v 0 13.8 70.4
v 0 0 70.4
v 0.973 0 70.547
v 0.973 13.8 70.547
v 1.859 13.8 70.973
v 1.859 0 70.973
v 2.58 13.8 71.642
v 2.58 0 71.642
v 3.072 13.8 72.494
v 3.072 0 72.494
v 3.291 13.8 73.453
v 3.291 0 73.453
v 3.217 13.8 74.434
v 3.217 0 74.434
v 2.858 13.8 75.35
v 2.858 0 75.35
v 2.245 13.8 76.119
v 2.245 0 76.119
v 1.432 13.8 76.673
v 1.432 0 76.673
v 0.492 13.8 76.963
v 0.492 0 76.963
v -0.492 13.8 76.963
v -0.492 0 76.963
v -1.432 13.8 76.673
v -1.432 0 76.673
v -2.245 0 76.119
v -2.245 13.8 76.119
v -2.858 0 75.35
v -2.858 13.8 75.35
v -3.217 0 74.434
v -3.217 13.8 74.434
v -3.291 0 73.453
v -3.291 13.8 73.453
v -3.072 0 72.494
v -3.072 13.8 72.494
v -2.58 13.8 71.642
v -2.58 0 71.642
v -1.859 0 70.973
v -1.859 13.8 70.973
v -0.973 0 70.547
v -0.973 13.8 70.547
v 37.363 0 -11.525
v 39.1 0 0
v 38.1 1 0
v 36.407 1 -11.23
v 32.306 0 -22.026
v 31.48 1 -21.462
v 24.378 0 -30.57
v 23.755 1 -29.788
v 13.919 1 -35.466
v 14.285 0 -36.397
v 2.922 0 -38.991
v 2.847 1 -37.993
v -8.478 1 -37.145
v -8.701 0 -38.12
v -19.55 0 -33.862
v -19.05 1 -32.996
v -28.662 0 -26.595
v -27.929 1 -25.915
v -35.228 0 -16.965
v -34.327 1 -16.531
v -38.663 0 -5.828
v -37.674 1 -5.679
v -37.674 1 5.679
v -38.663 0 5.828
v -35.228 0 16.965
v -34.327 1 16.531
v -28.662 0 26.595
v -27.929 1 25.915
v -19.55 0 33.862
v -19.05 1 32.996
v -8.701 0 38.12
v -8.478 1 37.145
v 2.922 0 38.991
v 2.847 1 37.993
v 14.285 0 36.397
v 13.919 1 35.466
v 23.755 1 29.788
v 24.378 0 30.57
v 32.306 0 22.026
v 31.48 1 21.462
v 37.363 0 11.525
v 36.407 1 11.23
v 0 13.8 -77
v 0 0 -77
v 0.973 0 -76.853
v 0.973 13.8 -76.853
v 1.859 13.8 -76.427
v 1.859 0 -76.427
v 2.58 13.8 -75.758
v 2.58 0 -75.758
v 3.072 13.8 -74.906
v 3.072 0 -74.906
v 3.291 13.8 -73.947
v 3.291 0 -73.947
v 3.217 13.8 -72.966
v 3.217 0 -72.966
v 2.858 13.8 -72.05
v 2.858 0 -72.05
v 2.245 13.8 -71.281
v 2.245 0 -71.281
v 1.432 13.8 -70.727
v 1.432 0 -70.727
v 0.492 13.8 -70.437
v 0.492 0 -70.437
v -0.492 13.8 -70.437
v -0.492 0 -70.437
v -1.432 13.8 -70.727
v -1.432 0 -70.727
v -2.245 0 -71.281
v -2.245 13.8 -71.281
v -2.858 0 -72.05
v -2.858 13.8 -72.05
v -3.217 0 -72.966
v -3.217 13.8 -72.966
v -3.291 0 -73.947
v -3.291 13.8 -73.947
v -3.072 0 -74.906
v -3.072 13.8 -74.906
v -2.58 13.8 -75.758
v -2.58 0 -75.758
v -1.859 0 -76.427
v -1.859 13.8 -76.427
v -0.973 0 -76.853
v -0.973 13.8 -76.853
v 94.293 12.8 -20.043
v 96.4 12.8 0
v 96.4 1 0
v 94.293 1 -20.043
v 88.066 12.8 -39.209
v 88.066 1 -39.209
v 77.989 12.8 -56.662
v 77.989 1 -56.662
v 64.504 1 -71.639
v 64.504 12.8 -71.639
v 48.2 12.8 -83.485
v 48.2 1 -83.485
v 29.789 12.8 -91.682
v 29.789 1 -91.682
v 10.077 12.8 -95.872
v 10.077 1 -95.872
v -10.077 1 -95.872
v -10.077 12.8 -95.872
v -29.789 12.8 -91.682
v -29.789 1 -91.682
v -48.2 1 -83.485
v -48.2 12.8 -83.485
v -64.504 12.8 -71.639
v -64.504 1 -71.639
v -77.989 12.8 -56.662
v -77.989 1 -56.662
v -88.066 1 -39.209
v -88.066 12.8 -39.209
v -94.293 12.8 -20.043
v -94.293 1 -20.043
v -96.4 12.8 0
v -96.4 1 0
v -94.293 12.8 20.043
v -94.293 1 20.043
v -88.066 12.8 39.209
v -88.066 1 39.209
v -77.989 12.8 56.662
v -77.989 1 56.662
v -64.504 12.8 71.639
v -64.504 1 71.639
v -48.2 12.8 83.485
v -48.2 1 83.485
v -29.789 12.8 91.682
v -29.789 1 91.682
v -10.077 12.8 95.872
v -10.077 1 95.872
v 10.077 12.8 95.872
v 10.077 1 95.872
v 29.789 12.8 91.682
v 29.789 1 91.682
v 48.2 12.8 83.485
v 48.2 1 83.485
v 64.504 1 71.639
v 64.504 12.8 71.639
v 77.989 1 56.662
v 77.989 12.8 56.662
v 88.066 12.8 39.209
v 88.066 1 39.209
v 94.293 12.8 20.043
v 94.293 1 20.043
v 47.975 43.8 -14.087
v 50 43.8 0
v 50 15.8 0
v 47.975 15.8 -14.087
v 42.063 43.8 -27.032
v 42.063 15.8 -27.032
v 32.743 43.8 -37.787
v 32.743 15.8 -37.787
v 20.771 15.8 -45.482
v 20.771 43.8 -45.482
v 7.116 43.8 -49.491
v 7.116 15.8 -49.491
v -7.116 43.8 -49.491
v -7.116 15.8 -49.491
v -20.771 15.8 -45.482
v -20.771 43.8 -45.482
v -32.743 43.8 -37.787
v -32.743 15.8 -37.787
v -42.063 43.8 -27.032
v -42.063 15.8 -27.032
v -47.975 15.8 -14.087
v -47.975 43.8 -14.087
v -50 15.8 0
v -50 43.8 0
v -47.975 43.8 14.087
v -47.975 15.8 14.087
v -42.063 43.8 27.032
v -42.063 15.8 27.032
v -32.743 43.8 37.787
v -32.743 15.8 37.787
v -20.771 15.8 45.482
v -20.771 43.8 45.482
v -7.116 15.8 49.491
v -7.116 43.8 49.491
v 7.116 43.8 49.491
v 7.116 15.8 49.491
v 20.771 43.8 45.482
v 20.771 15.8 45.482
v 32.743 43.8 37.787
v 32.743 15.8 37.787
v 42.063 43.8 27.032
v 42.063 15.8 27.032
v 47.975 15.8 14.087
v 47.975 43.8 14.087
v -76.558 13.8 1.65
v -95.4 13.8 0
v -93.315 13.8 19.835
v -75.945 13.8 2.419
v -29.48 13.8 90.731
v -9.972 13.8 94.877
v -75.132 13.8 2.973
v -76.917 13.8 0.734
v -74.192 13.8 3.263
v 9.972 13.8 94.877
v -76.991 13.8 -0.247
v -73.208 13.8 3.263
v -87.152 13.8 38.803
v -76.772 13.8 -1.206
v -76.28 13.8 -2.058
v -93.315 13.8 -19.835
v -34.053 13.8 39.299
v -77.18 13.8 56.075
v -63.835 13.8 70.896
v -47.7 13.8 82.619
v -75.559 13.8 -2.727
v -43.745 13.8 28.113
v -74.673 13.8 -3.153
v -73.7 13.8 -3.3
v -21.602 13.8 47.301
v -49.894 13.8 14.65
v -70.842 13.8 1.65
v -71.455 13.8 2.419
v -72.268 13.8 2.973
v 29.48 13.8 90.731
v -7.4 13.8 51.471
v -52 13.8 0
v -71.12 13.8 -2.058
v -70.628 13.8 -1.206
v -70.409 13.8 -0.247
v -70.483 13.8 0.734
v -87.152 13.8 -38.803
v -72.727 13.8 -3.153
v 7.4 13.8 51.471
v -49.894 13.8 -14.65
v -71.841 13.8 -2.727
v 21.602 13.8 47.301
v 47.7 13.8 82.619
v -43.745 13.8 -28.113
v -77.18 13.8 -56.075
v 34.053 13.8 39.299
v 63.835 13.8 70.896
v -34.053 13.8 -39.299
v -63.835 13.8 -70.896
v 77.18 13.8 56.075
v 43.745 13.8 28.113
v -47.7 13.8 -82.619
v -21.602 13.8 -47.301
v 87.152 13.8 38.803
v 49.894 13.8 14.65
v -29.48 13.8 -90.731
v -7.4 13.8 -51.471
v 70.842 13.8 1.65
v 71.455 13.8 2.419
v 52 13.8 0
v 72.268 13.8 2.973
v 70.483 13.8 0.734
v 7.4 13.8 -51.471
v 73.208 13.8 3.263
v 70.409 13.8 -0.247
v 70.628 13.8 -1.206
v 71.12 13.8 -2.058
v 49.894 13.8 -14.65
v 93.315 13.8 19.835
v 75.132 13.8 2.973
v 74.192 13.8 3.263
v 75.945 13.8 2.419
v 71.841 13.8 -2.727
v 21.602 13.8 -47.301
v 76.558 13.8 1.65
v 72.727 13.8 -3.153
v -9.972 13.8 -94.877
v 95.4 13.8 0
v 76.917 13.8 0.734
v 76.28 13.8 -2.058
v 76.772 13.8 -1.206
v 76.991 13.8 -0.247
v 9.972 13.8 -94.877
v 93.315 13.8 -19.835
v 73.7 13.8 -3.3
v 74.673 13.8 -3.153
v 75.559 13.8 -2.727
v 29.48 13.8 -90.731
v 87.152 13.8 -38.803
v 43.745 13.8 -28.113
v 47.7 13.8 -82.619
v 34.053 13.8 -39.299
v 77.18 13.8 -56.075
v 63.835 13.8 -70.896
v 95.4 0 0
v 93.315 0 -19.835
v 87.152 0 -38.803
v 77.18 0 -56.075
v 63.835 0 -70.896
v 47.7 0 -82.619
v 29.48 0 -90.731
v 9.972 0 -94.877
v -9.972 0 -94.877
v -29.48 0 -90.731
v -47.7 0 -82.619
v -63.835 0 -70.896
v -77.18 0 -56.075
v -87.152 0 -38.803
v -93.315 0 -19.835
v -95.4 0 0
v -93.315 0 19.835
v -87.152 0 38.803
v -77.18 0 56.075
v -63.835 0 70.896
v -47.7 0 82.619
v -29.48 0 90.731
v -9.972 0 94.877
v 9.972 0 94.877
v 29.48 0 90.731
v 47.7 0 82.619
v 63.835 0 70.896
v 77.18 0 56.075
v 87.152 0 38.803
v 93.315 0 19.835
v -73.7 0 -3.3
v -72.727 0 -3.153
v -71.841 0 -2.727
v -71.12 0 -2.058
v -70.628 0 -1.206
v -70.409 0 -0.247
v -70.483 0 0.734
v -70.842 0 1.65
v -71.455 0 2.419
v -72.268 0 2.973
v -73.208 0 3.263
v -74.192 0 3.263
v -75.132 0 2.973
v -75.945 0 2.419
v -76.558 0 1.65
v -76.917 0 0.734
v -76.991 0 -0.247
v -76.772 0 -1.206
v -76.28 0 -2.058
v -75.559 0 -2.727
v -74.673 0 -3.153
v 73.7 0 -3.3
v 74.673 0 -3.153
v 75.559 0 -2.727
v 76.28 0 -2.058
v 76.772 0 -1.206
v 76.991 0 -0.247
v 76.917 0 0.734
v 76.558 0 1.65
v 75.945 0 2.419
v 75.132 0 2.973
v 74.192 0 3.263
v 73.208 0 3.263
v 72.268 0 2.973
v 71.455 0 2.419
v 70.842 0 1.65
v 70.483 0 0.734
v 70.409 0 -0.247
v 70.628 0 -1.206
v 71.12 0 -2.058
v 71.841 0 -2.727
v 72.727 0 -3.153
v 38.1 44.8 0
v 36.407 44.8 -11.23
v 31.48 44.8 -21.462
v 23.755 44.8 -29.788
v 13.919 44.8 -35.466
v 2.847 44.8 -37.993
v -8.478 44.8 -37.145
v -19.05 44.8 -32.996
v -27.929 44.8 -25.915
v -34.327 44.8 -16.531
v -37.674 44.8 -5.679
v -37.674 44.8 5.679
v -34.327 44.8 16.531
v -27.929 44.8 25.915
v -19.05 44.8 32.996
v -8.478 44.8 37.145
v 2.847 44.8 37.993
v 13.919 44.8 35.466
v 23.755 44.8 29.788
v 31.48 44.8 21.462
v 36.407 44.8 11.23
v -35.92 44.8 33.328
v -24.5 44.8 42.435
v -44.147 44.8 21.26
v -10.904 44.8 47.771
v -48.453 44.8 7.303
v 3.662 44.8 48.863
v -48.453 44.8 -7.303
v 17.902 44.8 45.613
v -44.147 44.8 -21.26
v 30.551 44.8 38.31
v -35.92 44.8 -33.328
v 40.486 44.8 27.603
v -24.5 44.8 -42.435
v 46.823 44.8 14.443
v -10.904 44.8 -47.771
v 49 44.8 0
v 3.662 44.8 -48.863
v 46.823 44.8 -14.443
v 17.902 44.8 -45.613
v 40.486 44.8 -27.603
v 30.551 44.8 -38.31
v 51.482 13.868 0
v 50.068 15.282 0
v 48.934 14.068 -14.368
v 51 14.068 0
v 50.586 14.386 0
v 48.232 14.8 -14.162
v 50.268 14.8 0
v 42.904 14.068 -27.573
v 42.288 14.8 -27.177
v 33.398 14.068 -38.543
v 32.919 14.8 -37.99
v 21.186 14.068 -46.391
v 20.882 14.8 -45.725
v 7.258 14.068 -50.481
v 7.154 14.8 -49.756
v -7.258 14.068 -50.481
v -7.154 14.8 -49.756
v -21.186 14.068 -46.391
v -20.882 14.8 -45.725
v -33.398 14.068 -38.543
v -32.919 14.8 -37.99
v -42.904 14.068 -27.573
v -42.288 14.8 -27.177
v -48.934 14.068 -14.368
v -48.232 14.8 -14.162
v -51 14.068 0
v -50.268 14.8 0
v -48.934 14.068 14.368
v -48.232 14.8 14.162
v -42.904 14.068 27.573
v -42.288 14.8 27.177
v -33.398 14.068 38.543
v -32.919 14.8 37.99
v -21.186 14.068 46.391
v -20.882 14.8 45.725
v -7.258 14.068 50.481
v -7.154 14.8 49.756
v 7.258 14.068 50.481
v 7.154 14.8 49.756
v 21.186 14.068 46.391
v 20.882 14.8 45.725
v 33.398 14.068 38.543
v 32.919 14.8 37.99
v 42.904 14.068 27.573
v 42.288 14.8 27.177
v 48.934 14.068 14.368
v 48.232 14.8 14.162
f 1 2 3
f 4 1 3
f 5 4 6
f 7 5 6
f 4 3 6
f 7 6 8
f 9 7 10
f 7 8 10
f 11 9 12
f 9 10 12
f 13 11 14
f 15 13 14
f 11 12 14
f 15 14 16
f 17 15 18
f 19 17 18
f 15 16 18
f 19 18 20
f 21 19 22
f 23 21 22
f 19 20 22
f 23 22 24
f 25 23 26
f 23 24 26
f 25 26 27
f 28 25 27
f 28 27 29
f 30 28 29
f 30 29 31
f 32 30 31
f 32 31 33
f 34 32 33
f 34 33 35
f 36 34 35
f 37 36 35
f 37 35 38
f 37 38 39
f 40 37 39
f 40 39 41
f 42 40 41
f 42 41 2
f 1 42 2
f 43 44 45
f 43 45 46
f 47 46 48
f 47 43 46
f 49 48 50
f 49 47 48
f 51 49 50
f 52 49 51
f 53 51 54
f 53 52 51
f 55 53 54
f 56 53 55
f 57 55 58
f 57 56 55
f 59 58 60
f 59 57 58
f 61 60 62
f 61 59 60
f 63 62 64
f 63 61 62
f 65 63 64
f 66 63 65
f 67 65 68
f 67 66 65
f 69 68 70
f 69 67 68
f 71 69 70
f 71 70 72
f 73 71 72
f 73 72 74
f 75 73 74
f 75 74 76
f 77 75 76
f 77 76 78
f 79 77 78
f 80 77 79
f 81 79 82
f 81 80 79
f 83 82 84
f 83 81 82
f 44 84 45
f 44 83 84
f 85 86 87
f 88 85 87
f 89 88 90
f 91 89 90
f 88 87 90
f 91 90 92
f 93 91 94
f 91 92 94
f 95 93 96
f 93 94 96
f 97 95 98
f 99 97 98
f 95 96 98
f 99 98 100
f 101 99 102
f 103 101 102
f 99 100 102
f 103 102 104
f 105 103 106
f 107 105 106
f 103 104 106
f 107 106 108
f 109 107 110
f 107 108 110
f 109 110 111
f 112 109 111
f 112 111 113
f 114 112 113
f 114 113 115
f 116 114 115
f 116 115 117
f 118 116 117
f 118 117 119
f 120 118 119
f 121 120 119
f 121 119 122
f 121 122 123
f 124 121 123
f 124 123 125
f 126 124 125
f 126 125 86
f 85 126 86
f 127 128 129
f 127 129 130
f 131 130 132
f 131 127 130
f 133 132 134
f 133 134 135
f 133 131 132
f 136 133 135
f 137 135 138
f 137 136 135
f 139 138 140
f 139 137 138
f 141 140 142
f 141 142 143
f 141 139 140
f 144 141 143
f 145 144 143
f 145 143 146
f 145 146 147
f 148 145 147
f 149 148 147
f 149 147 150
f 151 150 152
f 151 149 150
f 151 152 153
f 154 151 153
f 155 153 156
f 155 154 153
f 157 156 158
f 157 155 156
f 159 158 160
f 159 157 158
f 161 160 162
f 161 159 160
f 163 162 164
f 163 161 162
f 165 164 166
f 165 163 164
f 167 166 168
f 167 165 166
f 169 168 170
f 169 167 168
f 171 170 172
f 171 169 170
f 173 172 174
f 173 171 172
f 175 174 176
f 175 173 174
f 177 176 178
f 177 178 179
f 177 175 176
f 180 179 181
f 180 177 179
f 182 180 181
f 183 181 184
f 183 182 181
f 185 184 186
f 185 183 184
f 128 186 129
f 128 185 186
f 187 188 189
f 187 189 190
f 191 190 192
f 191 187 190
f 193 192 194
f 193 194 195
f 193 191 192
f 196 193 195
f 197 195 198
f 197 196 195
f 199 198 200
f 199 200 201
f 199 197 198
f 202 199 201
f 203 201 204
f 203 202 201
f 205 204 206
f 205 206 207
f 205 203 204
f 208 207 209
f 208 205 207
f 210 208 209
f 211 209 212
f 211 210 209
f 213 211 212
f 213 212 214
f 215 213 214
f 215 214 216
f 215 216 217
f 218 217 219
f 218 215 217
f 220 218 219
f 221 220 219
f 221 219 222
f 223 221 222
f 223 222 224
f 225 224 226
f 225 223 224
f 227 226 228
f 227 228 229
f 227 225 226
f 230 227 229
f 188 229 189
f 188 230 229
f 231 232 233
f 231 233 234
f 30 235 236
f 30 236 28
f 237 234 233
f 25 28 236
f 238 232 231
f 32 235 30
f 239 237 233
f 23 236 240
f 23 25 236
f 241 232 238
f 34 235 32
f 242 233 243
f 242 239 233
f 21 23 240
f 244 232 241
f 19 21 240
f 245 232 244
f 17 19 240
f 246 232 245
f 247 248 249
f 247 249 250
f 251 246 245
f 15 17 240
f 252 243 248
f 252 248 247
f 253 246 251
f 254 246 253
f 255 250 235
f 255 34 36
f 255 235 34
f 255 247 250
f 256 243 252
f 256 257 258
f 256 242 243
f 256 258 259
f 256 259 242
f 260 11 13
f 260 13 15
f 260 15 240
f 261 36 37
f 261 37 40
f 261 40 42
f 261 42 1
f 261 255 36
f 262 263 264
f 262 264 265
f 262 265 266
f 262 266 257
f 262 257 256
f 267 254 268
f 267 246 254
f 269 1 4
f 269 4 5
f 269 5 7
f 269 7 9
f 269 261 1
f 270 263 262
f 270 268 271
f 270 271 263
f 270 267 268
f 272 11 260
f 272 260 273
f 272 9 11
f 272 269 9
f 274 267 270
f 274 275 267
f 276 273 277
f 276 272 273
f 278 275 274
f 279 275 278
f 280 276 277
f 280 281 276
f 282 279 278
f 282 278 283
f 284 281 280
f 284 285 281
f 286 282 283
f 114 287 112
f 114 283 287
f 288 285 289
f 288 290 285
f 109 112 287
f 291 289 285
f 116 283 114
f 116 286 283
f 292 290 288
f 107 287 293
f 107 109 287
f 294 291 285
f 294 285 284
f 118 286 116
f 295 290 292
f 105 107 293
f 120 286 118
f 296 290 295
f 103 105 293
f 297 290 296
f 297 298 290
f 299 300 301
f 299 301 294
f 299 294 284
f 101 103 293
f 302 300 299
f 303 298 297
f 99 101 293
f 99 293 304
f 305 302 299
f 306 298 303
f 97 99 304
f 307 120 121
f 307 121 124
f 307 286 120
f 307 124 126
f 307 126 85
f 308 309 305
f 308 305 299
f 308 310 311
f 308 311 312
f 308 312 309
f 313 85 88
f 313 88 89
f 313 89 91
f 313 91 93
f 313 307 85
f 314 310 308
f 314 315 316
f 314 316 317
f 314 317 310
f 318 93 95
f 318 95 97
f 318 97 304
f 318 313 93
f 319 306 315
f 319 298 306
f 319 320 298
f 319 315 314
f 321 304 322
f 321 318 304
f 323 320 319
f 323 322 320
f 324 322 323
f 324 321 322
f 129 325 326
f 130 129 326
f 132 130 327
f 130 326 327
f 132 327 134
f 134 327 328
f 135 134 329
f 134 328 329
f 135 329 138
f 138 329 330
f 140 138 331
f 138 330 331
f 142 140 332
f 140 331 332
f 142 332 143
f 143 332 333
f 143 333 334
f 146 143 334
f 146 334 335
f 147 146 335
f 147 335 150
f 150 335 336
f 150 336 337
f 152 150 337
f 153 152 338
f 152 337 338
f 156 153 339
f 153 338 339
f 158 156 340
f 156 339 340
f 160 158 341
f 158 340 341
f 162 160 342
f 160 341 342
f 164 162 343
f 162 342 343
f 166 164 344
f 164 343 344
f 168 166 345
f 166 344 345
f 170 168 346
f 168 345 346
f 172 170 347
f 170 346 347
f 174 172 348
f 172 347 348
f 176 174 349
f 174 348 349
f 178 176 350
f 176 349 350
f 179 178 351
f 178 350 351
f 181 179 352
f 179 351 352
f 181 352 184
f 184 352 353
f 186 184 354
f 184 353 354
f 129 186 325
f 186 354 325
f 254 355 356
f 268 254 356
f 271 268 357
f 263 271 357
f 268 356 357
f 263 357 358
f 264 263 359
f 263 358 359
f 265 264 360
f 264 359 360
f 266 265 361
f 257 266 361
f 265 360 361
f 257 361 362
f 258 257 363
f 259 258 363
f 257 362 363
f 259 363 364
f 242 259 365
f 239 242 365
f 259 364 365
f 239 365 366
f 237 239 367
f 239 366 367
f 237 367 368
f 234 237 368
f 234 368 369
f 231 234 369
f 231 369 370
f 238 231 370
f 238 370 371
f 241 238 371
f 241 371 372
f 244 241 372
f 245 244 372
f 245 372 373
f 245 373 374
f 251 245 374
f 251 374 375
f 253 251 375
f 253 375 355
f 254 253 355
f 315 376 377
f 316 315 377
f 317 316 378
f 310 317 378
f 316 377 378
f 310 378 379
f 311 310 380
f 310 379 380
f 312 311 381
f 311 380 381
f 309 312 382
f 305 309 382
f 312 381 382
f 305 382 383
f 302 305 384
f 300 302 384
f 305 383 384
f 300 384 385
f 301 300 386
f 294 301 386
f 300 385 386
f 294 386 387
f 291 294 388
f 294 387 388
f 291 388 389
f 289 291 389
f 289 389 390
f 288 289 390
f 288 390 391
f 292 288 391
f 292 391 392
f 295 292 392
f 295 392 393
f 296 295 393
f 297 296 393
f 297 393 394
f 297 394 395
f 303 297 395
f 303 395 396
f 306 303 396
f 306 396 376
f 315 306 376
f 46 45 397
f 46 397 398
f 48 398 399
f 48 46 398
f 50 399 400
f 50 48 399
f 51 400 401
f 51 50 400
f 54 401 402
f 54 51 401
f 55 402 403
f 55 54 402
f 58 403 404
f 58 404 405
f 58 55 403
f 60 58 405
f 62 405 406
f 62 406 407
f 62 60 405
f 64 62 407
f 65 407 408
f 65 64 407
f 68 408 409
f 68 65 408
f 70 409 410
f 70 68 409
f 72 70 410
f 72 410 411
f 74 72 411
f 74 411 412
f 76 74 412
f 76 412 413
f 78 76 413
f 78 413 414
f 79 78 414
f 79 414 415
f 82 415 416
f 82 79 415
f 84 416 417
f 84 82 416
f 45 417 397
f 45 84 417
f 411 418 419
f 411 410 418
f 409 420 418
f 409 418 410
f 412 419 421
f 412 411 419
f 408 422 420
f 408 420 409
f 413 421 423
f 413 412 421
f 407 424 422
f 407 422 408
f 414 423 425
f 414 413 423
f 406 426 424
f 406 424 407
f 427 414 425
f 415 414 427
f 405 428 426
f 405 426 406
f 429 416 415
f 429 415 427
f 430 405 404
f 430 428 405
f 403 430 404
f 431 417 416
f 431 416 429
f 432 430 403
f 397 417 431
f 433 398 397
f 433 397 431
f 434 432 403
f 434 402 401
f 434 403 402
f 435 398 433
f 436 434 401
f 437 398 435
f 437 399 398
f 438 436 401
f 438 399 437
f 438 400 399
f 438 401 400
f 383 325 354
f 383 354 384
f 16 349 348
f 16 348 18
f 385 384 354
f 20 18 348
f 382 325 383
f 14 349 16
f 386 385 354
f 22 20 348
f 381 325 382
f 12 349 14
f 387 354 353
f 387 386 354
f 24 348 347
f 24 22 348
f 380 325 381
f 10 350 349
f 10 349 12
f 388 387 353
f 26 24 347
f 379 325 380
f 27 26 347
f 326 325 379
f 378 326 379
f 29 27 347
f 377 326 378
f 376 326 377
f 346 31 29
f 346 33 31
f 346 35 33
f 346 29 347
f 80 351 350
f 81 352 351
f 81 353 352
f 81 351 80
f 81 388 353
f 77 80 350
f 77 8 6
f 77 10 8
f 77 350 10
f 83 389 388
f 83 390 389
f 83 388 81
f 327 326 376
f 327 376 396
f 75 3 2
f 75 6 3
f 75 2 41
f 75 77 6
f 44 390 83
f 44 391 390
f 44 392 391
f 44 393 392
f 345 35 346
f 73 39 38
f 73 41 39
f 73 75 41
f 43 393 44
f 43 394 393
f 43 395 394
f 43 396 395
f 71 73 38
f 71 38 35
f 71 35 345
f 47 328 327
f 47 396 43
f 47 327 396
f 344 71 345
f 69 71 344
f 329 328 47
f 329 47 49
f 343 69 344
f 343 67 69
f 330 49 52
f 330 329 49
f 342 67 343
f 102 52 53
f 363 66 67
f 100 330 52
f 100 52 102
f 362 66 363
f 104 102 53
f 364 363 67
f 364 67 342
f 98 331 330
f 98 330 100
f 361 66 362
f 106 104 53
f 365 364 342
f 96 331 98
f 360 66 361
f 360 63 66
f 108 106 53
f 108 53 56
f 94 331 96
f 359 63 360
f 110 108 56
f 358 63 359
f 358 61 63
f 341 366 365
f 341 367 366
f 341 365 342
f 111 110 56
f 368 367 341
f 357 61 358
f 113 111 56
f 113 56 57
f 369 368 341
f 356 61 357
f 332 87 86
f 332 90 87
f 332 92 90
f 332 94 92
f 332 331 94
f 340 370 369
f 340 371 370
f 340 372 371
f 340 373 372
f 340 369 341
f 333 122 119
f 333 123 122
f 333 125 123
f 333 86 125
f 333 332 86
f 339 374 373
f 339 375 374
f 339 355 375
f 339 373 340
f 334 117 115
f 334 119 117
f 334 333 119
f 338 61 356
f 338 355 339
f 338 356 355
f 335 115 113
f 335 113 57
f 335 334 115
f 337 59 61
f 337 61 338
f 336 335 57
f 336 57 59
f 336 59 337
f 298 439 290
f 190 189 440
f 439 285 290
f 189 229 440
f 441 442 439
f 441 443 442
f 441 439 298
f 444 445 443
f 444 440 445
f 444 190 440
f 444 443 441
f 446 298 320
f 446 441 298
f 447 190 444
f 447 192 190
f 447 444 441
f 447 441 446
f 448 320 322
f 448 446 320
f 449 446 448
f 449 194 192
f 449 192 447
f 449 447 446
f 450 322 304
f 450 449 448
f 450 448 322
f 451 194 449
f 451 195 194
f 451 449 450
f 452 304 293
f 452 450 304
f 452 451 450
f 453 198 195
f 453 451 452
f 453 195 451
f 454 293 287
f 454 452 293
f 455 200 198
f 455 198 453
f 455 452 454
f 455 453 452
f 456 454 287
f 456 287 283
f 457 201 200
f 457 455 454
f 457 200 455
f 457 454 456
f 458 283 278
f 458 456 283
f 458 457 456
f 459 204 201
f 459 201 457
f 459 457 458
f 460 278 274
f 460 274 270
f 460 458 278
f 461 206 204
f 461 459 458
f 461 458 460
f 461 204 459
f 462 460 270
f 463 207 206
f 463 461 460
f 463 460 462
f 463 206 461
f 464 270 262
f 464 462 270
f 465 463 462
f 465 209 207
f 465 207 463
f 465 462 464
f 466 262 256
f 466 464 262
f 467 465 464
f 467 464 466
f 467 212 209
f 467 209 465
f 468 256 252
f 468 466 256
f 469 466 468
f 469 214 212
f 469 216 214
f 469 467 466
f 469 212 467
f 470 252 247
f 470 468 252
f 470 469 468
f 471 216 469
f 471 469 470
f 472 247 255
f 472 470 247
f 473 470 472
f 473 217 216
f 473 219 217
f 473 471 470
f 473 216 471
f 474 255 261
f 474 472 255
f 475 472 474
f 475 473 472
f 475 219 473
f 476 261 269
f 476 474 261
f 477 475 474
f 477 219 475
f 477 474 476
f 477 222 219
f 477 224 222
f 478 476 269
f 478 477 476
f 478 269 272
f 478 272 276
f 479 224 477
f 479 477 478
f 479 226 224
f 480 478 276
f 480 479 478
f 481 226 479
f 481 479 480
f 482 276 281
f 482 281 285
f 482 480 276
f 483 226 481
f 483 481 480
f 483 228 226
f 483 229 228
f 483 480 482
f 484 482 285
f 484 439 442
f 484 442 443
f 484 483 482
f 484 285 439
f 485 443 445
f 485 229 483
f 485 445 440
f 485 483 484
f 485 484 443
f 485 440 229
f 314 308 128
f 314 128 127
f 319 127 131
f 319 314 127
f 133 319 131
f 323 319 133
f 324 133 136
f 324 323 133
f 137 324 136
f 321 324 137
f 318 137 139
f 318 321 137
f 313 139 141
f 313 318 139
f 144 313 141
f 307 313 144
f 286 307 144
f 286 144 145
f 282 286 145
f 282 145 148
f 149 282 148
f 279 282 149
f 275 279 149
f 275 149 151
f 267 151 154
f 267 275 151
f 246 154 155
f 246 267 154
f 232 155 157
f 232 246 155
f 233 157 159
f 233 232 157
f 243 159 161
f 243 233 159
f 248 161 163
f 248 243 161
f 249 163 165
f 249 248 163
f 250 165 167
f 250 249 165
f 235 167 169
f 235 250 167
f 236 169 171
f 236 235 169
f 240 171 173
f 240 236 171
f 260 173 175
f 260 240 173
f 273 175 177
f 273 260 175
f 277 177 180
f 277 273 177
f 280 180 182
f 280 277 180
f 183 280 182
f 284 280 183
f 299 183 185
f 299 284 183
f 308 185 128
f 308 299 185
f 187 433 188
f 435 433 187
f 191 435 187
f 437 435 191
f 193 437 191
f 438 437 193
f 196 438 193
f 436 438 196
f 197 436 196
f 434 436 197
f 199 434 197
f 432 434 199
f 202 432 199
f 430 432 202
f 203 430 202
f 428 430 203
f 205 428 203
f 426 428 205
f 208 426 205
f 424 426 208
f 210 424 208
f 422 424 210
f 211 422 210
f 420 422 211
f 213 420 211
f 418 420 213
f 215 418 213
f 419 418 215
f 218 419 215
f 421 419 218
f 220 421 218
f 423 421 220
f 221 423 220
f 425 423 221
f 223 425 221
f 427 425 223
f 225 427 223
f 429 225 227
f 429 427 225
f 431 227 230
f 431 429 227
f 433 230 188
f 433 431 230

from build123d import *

# Parameters (mm, degrees)
CHANFRO1_SIZE               = 1
FURO_COM_FOLGA_DE_M61_D     = 6.6
FURO_COM_FOLGA_DE_M61_DEPTH = 23.799
FURO_COM_FOLGA_DE_M61_TIP   = 1.982840043


with BuildPart() as part:
    # Esboço1 → Revolução1 (revolve)
    with BuildSketch(Plane.XY):
        with BuildLine():
            Line((96.4, 0), (96.4, 13.8))
            Line((96.4, 13.8), (52, 13.8))
            ThreePointArc((52, 13.8), (50.585786438, 14.385786438), (50, 15.8))
            Line((50, 15.8), (50, 44.8))
            Line((50, 44.8), (38.1, 44.8))
            Line((38.1, 44.8), (38.1, 0))
            Line((38.1, 0), (96.4, 0))
        make_face()
    revolve(axis=Axis((0, 0, 0), (0, 1, 0)))

    # Chanfro1
    chanfro1_edges = [part.edges().sort_by_distance(p)[0] for p in [
        (-96.4, 0, 0),
        (-96.4, 13.8, 0),
        (-50, 44.8, 0),
        (-38.1, 0, 0),
    ]]
    chamfer(chanfro1_edges, length=CHANFRO1_SIZE)

    # Furo com folga de M61
    with Locations(Plane.ZX.offset(13.8)):
        with Locations((0, 73.7), (73.7, 0), (0, -73.7), (-73.7, 0), (0, 0)):
            Hole(FURO_COM_FOLGA_DE_M61_D / 2, depth=FURO_COM_FOLGA_DE_M61_DEPTH)
            with Locations((0, 0, -(FURO_COM_FOLGA_DE_M61_DEPTH + FURO_COM_FOLGA_DE_M61_TIP / 2))):  # 118° drill point
                Cone(0, FURO_COM_FOLGA_DE_M61_D / 2, FURO_COM_FOLGA_DE_M61_TIP, mode=Mode.SUBTRACT)


solid = part.part
